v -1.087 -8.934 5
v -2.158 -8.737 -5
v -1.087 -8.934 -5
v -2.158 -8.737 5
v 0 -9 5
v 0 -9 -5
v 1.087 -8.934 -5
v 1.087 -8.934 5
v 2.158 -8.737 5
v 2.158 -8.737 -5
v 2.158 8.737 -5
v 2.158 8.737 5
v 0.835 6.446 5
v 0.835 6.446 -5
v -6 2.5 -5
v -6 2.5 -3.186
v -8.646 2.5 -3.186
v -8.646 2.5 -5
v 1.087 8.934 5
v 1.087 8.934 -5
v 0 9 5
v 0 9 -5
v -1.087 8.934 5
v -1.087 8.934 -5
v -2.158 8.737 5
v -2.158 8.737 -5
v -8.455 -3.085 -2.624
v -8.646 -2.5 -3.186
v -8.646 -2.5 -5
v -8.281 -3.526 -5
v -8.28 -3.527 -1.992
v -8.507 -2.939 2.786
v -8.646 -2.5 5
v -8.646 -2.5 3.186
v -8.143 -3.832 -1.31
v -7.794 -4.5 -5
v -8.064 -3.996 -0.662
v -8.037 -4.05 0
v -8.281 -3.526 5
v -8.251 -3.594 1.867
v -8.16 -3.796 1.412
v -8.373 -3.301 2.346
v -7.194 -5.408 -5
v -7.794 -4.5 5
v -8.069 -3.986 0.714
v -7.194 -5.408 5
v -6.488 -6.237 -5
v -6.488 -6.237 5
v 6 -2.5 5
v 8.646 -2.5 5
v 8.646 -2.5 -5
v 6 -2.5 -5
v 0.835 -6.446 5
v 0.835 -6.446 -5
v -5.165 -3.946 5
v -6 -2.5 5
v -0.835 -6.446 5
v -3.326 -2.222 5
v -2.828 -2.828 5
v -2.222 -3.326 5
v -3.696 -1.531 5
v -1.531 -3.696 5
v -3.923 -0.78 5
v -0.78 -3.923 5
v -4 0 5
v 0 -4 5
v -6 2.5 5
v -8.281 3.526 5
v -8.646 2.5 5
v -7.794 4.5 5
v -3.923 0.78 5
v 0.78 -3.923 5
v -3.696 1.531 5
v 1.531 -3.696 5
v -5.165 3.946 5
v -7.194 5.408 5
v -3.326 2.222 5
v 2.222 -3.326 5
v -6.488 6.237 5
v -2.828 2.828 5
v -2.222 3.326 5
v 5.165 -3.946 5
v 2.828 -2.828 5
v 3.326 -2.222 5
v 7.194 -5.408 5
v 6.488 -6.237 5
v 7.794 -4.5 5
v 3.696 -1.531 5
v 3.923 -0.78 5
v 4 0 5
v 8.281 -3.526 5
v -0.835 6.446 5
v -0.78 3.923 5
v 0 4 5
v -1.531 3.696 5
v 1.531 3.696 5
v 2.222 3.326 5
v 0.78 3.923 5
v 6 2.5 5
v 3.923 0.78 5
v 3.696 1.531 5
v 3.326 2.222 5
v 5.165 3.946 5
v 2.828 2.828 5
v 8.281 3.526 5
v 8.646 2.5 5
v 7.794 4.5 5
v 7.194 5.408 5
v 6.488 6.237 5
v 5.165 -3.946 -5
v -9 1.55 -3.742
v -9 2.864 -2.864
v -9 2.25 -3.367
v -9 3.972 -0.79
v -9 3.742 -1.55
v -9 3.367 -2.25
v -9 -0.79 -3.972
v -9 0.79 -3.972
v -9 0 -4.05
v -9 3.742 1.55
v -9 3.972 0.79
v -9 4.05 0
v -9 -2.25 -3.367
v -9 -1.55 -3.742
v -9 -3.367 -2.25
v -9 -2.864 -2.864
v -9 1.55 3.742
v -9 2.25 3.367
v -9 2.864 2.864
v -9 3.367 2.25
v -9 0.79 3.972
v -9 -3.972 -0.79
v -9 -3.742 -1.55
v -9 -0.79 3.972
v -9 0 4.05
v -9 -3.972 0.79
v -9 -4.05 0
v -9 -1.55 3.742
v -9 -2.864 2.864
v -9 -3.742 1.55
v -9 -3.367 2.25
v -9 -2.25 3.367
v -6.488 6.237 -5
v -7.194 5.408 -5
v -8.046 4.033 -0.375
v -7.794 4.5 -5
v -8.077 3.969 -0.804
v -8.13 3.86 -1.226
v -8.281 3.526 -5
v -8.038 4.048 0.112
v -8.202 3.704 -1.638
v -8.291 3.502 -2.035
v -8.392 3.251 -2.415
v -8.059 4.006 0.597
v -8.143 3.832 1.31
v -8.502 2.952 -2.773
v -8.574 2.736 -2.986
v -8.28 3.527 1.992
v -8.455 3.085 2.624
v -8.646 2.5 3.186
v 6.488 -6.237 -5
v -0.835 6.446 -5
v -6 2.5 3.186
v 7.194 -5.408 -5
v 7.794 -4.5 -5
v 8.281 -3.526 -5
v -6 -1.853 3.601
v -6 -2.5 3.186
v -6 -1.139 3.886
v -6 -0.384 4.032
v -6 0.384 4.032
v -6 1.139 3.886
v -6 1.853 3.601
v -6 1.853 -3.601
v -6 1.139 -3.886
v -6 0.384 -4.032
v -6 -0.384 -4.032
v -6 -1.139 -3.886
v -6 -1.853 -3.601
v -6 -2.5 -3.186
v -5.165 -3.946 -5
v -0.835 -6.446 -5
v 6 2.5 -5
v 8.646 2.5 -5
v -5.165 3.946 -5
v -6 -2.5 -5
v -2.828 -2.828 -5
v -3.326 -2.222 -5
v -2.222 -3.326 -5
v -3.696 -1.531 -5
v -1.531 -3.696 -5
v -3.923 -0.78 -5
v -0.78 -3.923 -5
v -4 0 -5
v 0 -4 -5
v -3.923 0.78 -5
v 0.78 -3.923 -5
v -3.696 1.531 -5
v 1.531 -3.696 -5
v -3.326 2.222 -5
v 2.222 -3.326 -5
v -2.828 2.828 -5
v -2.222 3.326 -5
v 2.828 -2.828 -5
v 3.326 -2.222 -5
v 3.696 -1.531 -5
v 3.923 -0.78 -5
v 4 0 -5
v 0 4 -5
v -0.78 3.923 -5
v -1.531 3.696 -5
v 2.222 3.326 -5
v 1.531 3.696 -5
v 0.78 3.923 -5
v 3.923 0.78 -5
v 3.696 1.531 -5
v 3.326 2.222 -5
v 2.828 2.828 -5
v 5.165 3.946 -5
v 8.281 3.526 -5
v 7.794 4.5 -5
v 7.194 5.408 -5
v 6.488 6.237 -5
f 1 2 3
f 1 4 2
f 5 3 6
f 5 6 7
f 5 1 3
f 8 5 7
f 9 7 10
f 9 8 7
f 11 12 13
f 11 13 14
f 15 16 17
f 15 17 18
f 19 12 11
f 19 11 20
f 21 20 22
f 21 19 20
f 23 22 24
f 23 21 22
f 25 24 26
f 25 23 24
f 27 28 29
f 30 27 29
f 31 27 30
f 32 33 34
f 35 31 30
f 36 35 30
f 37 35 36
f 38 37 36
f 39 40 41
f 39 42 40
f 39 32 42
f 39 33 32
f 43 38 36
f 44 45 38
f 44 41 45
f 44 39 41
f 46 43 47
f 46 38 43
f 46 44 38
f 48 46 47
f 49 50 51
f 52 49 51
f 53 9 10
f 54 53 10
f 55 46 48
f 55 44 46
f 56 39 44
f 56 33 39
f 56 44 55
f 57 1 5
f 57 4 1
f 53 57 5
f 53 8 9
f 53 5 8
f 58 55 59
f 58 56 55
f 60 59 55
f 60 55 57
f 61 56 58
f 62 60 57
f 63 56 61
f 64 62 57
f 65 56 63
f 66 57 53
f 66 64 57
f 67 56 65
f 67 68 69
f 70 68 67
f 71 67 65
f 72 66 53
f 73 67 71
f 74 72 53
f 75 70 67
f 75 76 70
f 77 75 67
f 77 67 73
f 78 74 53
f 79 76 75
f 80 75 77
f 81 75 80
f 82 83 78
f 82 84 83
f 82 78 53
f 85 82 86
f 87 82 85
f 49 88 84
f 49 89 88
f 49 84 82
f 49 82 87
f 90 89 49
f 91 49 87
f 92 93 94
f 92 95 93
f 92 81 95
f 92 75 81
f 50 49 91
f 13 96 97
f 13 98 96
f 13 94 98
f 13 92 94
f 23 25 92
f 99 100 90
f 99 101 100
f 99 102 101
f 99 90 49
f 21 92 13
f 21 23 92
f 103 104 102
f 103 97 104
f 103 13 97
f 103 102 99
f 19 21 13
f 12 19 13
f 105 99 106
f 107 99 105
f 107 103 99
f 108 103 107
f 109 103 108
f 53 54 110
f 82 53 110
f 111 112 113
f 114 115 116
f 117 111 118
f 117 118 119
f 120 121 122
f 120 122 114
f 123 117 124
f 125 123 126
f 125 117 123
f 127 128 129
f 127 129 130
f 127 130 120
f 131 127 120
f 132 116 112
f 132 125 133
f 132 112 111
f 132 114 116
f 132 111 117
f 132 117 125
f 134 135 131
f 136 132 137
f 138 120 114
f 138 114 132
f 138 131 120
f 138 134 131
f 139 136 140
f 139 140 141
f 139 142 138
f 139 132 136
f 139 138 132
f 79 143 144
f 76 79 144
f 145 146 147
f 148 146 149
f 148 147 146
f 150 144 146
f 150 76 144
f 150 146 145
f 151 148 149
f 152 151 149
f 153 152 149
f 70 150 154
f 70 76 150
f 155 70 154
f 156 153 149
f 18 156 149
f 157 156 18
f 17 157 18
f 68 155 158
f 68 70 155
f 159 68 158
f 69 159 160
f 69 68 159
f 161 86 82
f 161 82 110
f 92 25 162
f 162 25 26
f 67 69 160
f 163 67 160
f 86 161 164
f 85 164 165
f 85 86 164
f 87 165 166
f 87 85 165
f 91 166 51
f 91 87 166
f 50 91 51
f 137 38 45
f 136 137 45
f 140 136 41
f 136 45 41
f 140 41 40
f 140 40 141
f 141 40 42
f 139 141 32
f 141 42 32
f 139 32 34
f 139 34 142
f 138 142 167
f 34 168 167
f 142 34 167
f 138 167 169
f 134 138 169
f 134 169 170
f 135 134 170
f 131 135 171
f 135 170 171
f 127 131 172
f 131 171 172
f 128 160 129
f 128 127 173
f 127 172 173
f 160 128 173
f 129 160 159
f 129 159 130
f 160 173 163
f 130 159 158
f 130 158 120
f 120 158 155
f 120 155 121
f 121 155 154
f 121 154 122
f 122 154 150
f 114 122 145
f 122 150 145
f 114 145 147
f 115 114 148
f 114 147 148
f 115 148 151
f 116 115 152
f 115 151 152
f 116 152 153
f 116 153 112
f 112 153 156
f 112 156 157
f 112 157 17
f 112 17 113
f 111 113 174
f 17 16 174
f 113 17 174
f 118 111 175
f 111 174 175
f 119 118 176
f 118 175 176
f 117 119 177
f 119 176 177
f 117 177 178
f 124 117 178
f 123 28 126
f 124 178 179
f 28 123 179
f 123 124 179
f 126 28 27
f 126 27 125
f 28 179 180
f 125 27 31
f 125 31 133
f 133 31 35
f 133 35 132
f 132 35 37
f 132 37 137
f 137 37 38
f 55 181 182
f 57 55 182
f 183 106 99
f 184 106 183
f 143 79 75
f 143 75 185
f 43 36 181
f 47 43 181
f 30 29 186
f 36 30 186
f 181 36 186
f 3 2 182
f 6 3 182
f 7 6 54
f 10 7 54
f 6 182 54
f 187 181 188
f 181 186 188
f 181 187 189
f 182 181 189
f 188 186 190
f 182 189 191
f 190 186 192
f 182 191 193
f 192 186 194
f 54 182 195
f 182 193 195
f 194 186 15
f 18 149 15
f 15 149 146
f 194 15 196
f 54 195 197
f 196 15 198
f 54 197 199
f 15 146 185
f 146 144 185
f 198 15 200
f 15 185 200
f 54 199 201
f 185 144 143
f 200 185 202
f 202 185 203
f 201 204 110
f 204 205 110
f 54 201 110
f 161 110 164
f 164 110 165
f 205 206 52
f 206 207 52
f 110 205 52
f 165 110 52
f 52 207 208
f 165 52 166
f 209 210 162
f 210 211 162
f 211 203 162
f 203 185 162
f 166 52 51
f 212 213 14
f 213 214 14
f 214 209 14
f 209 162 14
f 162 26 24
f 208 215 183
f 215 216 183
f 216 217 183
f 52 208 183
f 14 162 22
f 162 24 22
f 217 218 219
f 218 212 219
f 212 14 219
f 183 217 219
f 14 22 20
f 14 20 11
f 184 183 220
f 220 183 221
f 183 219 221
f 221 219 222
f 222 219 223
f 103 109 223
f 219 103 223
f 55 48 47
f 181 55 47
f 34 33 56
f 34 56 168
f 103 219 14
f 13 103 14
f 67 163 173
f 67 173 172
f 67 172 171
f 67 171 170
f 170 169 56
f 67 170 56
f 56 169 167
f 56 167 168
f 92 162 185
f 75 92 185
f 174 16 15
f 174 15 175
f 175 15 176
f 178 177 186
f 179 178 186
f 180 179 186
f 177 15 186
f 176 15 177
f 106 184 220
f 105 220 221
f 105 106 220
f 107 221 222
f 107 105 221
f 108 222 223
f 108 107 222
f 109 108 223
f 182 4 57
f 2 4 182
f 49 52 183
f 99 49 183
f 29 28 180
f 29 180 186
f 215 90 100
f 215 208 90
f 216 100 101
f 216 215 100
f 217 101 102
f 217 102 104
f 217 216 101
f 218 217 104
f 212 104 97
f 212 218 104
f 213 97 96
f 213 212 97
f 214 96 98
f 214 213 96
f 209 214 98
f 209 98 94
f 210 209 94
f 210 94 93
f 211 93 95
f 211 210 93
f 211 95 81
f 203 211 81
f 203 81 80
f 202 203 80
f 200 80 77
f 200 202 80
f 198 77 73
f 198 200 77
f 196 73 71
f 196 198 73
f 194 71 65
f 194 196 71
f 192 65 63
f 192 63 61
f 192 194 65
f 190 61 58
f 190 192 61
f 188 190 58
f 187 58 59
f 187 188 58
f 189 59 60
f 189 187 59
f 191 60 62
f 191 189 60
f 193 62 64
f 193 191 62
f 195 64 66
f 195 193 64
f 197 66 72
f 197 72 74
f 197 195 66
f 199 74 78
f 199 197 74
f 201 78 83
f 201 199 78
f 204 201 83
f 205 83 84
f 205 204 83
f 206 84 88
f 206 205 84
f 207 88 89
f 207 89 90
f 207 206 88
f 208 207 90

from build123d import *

# Parameters (mm, degrees)
SKETCH1_R           = 9
SKETCH1_R_2         = 4
BOSS_EXTRUDE1_DEPTH = 5
SKETCH2_W           = 5
SKETCH2_H           = 10
CUT_EXTRUDE3_DEPTH  = 3
CIRPATTERN1_COUNT   = 6
SKETCH3_R           = 4.05
BOSS_EXTRUDE2_DEPTH = 3


with BuildPart() as part:
    # Sketch1 → Boss-Extrude1 (new, symmetric)
    with BuildSketch(Plane.XY):
        Circle(SKETCH1_R)
        Circle(SKETCH1_R_2, mode=Mode.SUBTRACT)
    extrude(amount=BOSS_EXTRUDE1_DEPTH, both=True)

    # Sketch2 → Cut-Extrude3 (cut)
    with BuildSketch(Plane(origin=(-9, -17.193061184, 0), x_dir=(0, -1, 0), z_dir=(1, 0, 0))):
        with Locations((-17.193061184, 0)):
            Rectangle(SKETCH2_W, SKETCH2_H)
    cut_extrude3 = extrude(amount=CUT_EXTRUDE3_DEPTH, mode=Mode.SUBTRACT)

    # CirPattern1: Cut-Extrude3 ×6 about axis
    cirpattern1_axis = Axis((0, 0, 5), (0, 0, 1))
    for i in range(1, CIRPATTERN1_COUNT):
        add(cut_extrude3.rotate(cirpattern1_axis, i * 360 / CIRPATTERN1_COUNT), mode=Mode.SUBTRACT)

    # Sketch3 → Boss-Extrude2 (add)
    with BuildSketch(Plane(origin=(-6, 0, 0), x_dir=(0, -1, 0), z_dir=(-1, 0, 0))):
        Circle(SKETCH3_R)
    extrude(amount=BOSS_EXTRUDE2_DEPTH)


solid = part.part
